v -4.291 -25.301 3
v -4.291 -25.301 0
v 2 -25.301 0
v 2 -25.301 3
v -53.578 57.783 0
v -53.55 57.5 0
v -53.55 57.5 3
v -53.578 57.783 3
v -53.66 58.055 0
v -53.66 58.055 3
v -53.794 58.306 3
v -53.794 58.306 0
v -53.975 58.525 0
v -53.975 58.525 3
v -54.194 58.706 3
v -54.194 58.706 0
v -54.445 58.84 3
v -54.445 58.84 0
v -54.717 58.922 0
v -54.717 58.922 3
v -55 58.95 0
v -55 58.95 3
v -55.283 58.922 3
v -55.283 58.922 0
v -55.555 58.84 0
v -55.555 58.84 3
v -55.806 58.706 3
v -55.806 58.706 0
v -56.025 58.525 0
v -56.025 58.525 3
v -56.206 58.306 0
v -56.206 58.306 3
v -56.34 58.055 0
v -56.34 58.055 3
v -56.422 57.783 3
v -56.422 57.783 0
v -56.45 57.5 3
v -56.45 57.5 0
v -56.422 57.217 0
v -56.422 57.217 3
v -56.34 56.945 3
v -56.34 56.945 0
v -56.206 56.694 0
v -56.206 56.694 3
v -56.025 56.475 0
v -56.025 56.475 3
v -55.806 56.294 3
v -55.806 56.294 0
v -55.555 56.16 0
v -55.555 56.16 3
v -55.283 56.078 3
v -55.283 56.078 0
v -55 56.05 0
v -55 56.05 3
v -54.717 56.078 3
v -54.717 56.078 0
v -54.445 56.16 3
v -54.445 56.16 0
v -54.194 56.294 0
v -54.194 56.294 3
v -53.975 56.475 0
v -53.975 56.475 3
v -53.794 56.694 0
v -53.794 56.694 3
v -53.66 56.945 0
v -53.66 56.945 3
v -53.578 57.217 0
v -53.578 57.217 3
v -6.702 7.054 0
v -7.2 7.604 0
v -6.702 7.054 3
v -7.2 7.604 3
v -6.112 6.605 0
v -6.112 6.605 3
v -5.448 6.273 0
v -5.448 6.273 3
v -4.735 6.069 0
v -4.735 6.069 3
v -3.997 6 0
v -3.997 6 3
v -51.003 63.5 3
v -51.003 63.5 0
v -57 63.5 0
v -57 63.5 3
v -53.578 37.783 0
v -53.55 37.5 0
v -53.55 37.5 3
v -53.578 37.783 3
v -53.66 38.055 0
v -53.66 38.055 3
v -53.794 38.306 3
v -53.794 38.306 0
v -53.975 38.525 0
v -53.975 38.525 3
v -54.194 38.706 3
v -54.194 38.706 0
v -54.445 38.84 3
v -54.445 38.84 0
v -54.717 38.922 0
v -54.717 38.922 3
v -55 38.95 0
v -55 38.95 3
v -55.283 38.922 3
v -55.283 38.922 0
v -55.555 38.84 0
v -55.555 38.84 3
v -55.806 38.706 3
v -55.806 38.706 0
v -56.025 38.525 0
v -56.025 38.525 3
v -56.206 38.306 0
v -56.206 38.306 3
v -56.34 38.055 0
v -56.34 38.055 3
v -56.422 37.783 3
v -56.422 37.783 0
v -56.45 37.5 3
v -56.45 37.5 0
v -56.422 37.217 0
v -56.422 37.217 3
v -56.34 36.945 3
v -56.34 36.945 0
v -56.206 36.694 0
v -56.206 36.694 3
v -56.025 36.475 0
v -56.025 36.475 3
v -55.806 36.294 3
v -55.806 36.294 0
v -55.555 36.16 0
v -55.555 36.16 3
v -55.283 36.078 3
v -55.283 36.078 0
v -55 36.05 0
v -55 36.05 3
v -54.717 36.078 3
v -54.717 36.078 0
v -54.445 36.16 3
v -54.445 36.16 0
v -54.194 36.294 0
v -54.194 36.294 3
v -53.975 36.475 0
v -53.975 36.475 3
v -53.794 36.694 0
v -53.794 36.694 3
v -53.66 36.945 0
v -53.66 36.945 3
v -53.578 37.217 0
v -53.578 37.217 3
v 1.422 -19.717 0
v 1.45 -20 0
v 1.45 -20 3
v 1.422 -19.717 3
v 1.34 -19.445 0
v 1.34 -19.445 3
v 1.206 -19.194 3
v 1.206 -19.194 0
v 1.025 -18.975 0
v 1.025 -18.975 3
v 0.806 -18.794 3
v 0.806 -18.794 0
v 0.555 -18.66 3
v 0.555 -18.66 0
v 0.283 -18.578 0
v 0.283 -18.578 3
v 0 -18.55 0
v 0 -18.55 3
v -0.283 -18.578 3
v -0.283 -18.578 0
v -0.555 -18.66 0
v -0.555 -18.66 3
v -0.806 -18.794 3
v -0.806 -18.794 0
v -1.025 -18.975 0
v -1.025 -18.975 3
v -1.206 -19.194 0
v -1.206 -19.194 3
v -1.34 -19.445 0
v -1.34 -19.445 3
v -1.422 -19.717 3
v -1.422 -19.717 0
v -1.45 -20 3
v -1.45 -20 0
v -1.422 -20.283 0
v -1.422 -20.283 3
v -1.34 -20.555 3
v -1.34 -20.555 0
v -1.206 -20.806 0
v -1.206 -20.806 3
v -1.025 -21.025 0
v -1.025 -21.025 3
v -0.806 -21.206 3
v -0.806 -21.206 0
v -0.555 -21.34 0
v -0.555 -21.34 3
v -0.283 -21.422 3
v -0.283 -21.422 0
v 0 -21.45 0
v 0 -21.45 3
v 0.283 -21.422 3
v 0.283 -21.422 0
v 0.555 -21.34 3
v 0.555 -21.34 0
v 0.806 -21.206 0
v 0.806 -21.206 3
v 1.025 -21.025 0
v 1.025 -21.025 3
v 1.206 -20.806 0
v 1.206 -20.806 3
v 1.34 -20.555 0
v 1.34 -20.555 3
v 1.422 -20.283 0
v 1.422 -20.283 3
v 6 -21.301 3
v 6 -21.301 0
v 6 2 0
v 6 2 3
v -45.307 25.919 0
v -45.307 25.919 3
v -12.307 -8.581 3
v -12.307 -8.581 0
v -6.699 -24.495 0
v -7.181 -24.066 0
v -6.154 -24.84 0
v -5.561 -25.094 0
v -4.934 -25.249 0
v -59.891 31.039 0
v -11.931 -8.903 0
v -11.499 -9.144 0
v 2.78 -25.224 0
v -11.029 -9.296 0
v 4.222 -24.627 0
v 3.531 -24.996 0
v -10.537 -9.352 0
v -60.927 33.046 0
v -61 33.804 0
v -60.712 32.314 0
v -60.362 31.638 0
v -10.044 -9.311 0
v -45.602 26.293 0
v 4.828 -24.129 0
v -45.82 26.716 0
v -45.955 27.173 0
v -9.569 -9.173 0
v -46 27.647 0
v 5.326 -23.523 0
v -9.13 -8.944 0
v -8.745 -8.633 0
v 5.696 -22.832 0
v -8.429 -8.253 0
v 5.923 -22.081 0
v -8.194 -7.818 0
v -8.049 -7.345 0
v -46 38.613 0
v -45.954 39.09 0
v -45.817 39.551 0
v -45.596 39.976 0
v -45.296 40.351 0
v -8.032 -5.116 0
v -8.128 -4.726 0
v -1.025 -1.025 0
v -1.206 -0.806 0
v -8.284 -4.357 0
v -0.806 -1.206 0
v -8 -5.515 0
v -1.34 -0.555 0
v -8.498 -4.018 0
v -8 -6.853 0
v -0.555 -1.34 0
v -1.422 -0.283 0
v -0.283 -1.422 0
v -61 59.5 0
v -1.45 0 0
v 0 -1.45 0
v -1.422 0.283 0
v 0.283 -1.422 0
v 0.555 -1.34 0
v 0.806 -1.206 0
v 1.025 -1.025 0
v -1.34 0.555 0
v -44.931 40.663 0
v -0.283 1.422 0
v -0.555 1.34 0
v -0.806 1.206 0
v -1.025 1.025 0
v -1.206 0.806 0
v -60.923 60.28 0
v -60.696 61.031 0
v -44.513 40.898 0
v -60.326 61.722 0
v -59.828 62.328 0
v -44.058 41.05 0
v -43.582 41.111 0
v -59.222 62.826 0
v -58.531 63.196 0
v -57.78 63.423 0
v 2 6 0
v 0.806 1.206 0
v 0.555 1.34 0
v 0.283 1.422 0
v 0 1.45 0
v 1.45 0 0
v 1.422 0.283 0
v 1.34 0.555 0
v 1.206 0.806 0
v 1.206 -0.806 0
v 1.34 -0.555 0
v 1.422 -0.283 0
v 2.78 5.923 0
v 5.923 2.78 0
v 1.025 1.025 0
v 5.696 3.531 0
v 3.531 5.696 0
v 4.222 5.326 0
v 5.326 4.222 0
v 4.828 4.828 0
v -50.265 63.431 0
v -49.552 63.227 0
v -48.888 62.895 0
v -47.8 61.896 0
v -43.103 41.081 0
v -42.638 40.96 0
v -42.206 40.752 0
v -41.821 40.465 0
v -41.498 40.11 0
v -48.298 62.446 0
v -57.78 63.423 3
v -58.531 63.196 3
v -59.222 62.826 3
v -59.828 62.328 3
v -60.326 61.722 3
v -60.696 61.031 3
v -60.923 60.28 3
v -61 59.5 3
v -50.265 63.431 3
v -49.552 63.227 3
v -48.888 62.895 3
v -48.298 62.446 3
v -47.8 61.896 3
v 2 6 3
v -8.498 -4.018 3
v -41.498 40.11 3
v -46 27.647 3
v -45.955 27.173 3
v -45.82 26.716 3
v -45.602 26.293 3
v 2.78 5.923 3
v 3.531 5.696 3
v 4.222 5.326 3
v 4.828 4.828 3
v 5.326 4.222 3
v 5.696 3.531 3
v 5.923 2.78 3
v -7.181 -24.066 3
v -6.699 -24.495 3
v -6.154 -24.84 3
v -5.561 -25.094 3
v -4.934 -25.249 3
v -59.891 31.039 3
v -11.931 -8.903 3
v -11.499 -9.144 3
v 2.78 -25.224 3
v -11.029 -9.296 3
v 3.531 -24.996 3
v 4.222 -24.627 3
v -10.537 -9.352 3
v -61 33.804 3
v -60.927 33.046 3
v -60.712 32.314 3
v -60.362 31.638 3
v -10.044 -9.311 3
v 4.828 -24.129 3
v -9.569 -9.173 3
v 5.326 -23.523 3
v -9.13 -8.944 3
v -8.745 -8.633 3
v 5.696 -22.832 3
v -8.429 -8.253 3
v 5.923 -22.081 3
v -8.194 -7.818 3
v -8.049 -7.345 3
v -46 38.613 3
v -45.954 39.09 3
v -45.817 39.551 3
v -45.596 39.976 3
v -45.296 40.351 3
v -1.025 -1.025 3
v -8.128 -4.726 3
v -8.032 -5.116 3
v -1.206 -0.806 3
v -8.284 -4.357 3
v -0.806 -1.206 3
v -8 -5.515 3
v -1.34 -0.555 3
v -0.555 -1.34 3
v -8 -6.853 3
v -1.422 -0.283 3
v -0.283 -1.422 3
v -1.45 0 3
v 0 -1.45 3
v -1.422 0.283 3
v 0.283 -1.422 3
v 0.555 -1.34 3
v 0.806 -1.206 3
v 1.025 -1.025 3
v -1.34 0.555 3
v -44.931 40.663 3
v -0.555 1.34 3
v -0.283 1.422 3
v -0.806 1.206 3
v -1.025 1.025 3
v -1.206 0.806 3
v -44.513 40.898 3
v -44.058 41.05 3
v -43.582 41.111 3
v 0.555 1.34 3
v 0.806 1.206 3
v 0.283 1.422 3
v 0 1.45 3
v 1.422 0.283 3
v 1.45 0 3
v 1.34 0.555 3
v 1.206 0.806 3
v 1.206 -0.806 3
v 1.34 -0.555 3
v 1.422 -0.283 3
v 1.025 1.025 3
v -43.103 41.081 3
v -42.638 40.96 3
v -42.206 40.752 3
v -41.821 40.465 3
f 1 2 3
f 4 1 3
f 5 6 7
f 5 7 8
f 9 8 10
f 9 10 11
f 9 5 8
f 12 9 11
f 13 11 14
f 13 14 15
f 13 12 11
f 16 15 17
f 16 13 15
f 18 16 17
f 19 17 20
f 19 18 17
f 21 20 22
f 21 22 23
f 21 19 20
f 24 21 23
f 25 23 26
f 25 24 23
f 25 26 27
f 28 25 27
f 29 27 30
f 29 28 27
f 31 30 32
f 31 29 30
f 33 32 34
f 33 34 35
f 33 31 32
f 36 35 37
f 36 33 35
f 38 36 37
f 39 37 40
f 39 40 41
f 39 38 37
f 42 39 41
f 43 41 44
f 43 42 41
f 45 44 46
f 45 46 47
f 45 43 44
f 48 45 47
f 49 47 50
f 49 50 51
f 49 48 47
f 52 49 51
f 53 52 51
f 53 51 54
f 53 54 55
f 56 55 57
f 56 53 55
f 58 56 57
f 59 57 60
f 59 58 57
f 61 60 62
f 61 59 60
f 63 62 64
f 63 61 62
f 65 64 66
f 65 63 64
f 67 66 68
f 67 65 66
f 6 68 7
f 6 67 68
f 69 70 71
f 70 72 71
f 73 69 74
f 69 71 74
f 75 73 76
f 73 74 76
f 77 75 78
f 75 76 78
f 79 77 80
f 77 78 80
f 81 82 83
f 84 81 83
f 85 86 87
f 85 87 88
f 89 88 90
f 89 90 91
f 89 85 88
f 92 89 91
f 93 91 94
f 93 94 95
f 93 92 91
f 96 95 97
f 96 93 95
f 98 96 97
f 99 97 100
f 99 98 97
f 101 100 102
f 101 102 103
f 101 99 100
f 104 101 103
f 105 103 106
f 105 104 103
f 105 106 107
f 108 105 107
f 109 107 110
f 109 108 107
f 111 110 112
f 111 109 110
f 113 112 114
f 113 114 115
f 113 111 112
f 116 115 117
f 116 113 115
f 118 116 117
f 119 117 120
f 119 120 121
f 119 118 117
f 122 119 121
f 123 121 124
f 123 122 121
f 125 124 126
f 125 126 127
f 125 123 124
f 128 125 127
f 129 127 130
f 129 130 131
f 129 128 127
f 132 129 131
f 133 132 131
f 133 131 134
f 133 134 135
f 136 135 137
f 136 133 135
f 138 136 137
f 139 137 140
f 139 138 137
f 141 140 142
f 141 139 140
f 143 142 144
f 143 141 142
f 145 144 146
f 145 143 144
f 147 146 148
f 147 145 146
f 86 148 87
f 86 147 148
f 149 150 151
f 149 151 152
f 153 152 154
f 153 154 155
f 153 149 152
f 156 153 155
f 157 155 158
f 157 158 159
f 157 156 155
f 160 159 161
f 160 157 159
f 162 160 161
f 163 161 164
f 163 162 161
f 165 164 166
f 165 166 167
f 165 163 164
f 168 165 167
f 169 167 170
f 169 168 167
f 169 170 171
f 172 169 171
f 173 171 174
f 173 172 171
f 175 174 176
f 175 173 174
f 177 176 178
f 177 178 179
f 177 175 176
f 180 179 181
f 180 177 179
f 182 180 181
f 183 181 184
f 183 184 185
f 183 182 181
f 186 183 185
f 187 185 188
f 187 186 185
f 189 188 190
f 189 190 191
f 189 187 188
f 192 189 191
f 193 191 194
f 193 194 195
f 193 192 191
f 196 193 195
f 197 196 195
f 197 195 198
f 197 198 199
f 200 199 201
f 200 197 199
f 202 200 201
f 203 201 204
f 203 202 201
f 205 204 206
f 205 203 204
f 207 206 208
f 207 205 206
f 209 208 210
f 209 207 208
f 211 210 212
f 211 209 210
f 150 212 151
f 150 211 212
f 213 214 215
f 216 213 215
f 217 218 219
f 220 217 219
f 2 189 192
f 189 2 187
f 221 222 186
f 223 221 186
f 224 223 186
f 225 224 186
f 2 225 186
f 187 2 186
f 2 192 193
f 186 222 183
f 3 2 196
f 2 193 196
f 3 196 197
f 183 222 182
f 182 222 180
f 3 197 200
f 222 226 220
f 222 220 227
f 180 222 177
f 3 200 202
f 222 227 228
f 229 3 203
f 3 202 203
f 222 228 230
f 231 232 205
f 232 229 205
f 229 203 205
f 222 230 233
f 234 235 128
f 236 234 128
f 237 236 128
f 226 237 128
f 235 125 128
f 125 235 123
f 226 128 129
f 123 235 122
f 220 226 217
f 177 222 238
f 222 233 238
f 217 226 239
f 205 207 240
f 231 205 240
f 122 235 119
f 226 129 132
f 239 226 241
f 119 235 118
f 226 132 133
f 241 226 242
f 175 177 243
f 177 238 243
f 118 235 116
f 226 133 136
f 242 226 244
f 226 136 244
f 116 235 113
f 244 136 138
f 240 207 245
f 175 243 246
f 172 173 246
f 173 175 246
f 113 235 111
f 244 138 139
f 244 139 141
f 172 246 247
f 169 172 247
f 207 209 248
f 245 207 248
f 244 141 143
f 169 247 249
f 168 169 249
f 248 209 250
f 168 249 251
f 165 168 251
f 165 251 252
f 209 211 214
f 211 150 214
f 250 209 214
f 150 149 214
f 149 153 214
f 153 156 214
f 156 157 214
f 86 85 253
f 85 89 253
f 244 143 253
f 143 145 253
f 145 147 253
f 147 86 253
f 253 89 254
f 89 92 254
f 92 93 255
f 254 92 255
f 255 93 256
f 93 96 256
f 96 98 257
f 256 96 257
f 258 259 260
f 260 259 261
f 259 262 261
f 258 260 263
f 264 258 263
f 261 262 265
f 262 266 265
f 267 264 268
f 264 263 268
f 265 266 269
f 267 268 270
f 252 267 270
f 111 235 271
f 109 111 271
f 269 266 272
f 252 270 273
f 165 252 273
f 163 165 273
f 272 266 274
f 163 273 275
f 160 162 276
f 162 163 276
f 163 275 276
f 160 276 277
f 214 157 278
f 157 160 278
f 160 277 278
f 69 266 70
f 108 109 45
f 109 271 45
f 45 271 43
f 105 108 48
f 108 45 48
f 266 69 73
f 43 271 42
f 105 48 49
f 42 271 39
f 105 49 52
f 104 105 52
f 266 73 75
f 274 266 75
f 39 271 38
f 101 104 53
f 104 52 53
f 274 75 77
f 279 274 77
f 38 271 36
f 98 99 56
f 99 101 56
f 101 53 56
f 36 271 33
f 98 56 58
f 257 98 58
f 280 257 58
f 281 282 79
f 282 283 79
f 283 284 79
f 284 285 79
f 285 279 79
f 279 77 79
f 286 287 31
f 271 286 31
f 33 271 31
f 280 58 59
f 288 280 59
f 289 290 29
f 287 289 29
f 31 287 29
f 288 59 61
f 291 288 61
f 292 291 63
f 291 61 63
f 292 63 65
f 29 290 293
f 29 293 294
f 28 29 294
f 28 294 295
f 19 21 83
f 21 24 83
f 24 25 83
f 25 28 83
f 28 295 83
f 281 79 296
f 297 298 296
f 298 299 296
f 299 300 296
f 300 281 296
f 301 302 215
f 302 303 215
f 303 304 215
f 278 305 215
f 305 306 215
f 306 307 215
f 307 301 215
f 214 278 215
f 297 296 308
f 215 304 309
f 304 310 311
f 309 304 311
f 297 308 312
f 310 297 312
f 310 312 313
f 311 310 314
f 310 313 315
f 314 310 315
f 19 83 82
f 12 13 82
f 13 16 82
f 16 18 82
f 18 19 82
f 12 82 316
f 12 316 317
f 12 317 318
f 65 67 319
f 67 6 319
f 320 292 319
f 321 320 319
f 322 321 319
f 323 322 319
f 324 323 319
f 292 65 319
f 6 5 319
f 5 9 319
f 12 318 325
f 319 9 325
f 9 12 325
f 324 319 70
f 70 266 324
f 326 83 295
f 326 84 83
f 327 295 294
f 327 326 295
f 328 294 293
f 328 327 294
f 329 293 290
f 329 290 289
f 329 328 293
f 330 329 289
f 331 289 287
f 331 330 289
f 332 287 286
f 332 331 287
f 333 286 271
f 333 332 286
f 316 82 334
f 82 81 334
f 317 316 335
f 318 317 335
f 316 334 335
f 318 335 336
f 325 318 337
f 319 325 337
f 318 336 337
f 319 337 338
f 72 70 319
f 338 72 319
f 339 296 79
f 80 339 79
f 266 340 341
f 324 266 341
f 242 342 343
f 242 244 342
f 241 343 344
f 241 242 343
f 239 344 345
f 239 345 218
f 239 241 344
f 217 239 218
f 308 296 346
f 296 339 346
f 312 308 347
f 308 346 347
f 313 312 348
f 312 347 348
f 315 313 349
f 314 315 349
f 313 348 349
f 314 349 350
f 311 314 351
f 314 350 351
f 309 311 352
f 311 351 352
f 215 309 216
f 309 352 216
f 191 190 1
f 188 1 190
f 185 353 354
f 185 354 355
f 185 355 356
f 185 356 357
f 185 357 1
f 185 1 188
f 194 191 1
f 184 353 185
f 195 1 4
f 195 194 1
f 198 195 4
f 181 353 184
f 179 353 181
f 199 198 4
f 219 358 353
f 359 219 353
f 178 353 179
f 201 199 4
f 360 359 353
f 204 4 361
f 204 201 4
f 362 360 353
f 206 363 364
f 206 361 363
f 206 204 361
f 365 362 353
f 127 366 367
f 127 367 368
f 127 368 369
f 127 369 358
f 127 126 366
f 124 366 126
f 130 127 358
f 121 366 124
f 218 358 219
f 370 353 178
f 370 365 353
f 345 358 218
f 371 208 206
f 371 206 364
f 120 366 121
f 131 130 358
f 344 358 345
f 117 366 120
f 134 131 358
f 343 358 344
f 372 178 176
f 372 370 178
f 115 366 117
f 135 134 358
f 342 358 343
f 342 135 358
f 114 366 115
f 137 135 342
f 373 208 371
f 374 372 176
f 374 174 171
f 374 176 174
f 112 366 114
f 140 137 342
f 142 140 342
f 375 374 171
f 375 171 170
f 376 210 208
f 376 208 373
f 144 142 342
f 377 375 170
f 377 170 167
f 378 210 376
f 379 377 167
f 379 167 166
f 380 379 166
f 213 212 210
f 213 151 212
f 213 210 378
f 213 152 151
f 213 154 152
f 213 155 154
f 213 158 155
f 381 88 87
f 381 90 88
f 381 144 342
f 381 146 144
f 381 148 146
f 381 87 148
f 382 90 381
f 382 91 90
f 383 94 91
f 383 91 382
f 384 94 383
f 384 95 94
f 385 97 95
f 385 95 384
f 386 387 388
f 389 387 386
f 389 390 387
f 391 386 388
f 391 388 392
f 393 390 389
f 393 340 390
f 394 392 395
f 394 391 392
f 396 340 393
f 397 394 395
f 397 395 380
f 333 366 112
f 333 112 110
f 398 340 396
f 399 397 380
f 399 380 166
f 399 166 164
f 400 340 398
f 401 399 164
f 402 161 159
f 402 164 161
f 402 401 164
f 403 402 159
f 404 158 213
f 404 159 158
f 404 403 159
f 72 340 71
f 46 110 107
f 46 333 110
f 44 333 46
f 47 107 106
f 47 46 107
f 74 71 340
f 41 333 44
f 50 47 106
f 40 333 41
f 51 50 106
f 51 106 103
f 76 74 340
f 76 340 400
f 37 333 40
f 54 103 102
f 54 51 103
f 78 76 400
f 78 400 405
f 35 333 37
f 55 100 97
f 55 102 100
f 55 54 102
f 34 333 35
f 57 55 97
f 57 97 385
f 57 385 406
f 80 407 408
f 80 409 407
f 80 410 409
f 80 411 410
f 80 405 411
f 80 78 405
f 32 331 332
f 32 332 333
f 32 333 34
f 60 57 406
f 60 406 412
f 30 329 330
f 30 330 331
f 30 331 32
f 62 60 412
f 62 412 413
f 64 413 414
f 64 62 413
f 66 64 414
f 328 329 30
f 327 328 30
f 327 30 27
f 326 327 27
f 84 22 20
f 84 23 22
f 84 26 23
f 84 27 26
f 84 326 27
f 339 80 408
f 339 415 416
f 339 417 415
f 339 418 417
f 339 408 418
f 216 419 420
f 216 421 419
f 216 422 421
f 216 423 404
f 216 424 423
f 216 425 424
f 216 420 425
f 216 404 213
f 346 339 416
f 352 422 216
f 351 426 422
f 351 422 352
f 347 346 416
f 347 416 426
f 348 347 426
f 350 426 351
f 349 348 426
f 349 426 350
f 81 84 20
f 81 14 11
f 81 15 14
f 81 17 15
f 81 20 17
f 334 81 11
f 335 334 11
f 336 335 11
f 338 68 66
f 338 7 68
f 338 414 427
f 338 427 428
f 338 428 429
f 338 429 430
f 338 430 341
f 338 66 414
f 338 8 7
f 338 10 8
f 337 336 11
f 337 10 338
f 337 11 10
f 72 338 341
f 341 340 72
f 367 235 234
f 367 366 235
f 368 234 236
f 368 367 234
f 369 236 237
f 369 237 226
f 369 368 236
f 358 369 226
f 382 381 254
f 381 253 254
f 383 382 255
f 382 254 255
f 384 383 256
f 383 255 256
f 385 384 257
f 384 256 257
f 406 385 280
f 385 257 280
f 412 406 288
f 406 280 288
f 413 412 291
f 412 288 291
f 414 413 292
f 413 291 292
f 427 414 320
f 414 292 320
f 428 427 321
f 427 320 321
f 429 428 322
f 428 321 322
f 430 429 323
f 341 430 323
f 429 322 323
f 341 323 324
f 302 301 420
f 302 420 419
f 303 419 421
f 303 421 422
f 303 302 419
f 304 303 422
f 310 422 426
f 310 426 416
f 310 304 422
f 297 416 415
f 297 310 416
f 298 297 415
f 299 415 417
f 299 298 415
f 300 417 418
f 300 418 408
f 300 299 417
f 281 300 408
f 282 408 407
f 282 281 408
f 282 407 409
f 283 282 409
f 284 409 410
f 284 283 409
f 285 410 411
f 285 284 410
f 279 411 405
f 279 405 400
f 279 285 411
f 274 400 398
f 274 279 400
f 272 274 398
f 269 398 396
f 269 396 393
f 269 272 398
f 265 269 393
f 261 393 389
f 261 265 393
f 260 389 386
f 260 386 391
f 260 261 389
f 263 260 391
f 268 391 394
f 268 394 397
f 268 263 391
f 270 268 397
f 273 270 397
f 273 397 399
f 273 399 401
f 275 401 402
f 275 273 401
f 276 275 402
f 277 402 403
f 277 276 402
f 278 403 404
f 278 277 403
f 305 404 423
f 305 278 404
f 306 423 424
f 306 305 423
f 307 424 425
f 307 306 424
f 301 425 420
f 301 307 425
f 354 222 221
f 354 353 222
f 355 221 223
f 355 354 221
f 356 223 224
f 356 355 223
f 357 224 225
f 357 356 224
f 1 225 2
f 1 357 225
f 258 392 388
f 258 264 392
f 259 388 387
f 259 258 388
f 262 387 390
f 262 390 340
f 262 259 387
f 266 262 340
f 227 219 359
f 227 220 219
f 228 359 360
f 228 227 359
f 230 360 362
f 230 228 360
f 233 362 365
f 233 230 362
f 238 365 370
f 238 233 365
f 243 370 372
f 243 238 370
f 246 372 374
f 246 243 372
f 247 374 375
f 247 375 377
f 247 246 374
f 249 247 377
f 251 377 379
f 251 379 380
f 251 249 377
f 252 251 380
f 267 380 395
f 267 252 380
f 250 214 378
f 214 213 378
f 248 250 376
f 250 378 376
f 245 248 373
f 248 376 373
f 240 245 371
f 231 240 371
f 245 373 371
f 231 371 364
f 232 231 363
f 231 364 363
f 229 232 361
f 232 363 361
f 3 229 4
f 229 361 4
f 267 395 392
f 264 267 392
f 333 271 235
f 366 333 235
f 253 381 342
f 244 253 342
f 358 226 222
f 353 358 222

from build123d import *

# Parameters (mm, degrees)
SKETCH_1_R          = 1.45
EXTRUDE_1_DEPTH     = 3
CUT_EXTRUDE_1_DEPTH = 3
FILLET_1_R          = 4
FILLET_2_R          = 2.5


with BuildPart() as part:
    # 草图1 → 凸台-拉伸1 (new body)
    with BuildSketch(Plane.XY):
        Polygon((-49, 63.5), (-61, 63.5), (-61, 32.199032391), (-6, -25.300967609), (6, -25.300967609), (6, 6), (-6, 6), align=None)
        Circle(SKETCH_1_R, mode=Mode.SUBTRACT)
        with Locations((0, -20)):
            Circle(SKETCH_1_R, mode=Mode.SUBTRACT)
        with Locations((-55, 37.5)):
            Circle(SKETCH_1_R, mode=Mode.SUBTRACT)
        with Locations((-55, 57.5)):
            Circle(SKETCH_1_R, mode=Mode.SUBTRACT)
    extrude(amount=EXTRUDE_1_DEPTH)

    # 草图2 → 切除-拉伸1 (cut)
    with BuildSketch(Plane.XY.offset(3)):
        Polygon((-46, 46.130219602), (-46, 26.644197231), (-8, -13.083075497), (-8, -4.683733886), align=None)
    extrude(amount=-CUT_EXTRUDE_1_DEPTH, mode=Mode.SUBTRACT)

    # 圆角1
    fillet_1_edges = [part.edges().sort_by_distance(p)[0] for p in [
        (-6, 6, 1.5),
        (6, 6, 1.5),
        (6, -25.300967609, 1.5),
        (-6, -25.300967609, 1.5),
        (-61, 32.199032391, 1.5),
        (-61, 63.5, 1.5),
        (-49, 63.5, 1.5),
    ]]
    fillet(fillet_1_edges, radius=FILLET_1_R)

    # 圆角2
    fillet_2_edges = [part.edges().sort_by_distance(p)[0] for p in [
        (-46, 46.130219602, 1.5),
        (-8, -4.683733886, 1.5),
        (-8, -13.083075497, 1.5),
        (-46, 26.644197231, 1.5),
    ]]
    fillet(fillet_2_edges, radius=FILLET_2_R)


solid = part.part
